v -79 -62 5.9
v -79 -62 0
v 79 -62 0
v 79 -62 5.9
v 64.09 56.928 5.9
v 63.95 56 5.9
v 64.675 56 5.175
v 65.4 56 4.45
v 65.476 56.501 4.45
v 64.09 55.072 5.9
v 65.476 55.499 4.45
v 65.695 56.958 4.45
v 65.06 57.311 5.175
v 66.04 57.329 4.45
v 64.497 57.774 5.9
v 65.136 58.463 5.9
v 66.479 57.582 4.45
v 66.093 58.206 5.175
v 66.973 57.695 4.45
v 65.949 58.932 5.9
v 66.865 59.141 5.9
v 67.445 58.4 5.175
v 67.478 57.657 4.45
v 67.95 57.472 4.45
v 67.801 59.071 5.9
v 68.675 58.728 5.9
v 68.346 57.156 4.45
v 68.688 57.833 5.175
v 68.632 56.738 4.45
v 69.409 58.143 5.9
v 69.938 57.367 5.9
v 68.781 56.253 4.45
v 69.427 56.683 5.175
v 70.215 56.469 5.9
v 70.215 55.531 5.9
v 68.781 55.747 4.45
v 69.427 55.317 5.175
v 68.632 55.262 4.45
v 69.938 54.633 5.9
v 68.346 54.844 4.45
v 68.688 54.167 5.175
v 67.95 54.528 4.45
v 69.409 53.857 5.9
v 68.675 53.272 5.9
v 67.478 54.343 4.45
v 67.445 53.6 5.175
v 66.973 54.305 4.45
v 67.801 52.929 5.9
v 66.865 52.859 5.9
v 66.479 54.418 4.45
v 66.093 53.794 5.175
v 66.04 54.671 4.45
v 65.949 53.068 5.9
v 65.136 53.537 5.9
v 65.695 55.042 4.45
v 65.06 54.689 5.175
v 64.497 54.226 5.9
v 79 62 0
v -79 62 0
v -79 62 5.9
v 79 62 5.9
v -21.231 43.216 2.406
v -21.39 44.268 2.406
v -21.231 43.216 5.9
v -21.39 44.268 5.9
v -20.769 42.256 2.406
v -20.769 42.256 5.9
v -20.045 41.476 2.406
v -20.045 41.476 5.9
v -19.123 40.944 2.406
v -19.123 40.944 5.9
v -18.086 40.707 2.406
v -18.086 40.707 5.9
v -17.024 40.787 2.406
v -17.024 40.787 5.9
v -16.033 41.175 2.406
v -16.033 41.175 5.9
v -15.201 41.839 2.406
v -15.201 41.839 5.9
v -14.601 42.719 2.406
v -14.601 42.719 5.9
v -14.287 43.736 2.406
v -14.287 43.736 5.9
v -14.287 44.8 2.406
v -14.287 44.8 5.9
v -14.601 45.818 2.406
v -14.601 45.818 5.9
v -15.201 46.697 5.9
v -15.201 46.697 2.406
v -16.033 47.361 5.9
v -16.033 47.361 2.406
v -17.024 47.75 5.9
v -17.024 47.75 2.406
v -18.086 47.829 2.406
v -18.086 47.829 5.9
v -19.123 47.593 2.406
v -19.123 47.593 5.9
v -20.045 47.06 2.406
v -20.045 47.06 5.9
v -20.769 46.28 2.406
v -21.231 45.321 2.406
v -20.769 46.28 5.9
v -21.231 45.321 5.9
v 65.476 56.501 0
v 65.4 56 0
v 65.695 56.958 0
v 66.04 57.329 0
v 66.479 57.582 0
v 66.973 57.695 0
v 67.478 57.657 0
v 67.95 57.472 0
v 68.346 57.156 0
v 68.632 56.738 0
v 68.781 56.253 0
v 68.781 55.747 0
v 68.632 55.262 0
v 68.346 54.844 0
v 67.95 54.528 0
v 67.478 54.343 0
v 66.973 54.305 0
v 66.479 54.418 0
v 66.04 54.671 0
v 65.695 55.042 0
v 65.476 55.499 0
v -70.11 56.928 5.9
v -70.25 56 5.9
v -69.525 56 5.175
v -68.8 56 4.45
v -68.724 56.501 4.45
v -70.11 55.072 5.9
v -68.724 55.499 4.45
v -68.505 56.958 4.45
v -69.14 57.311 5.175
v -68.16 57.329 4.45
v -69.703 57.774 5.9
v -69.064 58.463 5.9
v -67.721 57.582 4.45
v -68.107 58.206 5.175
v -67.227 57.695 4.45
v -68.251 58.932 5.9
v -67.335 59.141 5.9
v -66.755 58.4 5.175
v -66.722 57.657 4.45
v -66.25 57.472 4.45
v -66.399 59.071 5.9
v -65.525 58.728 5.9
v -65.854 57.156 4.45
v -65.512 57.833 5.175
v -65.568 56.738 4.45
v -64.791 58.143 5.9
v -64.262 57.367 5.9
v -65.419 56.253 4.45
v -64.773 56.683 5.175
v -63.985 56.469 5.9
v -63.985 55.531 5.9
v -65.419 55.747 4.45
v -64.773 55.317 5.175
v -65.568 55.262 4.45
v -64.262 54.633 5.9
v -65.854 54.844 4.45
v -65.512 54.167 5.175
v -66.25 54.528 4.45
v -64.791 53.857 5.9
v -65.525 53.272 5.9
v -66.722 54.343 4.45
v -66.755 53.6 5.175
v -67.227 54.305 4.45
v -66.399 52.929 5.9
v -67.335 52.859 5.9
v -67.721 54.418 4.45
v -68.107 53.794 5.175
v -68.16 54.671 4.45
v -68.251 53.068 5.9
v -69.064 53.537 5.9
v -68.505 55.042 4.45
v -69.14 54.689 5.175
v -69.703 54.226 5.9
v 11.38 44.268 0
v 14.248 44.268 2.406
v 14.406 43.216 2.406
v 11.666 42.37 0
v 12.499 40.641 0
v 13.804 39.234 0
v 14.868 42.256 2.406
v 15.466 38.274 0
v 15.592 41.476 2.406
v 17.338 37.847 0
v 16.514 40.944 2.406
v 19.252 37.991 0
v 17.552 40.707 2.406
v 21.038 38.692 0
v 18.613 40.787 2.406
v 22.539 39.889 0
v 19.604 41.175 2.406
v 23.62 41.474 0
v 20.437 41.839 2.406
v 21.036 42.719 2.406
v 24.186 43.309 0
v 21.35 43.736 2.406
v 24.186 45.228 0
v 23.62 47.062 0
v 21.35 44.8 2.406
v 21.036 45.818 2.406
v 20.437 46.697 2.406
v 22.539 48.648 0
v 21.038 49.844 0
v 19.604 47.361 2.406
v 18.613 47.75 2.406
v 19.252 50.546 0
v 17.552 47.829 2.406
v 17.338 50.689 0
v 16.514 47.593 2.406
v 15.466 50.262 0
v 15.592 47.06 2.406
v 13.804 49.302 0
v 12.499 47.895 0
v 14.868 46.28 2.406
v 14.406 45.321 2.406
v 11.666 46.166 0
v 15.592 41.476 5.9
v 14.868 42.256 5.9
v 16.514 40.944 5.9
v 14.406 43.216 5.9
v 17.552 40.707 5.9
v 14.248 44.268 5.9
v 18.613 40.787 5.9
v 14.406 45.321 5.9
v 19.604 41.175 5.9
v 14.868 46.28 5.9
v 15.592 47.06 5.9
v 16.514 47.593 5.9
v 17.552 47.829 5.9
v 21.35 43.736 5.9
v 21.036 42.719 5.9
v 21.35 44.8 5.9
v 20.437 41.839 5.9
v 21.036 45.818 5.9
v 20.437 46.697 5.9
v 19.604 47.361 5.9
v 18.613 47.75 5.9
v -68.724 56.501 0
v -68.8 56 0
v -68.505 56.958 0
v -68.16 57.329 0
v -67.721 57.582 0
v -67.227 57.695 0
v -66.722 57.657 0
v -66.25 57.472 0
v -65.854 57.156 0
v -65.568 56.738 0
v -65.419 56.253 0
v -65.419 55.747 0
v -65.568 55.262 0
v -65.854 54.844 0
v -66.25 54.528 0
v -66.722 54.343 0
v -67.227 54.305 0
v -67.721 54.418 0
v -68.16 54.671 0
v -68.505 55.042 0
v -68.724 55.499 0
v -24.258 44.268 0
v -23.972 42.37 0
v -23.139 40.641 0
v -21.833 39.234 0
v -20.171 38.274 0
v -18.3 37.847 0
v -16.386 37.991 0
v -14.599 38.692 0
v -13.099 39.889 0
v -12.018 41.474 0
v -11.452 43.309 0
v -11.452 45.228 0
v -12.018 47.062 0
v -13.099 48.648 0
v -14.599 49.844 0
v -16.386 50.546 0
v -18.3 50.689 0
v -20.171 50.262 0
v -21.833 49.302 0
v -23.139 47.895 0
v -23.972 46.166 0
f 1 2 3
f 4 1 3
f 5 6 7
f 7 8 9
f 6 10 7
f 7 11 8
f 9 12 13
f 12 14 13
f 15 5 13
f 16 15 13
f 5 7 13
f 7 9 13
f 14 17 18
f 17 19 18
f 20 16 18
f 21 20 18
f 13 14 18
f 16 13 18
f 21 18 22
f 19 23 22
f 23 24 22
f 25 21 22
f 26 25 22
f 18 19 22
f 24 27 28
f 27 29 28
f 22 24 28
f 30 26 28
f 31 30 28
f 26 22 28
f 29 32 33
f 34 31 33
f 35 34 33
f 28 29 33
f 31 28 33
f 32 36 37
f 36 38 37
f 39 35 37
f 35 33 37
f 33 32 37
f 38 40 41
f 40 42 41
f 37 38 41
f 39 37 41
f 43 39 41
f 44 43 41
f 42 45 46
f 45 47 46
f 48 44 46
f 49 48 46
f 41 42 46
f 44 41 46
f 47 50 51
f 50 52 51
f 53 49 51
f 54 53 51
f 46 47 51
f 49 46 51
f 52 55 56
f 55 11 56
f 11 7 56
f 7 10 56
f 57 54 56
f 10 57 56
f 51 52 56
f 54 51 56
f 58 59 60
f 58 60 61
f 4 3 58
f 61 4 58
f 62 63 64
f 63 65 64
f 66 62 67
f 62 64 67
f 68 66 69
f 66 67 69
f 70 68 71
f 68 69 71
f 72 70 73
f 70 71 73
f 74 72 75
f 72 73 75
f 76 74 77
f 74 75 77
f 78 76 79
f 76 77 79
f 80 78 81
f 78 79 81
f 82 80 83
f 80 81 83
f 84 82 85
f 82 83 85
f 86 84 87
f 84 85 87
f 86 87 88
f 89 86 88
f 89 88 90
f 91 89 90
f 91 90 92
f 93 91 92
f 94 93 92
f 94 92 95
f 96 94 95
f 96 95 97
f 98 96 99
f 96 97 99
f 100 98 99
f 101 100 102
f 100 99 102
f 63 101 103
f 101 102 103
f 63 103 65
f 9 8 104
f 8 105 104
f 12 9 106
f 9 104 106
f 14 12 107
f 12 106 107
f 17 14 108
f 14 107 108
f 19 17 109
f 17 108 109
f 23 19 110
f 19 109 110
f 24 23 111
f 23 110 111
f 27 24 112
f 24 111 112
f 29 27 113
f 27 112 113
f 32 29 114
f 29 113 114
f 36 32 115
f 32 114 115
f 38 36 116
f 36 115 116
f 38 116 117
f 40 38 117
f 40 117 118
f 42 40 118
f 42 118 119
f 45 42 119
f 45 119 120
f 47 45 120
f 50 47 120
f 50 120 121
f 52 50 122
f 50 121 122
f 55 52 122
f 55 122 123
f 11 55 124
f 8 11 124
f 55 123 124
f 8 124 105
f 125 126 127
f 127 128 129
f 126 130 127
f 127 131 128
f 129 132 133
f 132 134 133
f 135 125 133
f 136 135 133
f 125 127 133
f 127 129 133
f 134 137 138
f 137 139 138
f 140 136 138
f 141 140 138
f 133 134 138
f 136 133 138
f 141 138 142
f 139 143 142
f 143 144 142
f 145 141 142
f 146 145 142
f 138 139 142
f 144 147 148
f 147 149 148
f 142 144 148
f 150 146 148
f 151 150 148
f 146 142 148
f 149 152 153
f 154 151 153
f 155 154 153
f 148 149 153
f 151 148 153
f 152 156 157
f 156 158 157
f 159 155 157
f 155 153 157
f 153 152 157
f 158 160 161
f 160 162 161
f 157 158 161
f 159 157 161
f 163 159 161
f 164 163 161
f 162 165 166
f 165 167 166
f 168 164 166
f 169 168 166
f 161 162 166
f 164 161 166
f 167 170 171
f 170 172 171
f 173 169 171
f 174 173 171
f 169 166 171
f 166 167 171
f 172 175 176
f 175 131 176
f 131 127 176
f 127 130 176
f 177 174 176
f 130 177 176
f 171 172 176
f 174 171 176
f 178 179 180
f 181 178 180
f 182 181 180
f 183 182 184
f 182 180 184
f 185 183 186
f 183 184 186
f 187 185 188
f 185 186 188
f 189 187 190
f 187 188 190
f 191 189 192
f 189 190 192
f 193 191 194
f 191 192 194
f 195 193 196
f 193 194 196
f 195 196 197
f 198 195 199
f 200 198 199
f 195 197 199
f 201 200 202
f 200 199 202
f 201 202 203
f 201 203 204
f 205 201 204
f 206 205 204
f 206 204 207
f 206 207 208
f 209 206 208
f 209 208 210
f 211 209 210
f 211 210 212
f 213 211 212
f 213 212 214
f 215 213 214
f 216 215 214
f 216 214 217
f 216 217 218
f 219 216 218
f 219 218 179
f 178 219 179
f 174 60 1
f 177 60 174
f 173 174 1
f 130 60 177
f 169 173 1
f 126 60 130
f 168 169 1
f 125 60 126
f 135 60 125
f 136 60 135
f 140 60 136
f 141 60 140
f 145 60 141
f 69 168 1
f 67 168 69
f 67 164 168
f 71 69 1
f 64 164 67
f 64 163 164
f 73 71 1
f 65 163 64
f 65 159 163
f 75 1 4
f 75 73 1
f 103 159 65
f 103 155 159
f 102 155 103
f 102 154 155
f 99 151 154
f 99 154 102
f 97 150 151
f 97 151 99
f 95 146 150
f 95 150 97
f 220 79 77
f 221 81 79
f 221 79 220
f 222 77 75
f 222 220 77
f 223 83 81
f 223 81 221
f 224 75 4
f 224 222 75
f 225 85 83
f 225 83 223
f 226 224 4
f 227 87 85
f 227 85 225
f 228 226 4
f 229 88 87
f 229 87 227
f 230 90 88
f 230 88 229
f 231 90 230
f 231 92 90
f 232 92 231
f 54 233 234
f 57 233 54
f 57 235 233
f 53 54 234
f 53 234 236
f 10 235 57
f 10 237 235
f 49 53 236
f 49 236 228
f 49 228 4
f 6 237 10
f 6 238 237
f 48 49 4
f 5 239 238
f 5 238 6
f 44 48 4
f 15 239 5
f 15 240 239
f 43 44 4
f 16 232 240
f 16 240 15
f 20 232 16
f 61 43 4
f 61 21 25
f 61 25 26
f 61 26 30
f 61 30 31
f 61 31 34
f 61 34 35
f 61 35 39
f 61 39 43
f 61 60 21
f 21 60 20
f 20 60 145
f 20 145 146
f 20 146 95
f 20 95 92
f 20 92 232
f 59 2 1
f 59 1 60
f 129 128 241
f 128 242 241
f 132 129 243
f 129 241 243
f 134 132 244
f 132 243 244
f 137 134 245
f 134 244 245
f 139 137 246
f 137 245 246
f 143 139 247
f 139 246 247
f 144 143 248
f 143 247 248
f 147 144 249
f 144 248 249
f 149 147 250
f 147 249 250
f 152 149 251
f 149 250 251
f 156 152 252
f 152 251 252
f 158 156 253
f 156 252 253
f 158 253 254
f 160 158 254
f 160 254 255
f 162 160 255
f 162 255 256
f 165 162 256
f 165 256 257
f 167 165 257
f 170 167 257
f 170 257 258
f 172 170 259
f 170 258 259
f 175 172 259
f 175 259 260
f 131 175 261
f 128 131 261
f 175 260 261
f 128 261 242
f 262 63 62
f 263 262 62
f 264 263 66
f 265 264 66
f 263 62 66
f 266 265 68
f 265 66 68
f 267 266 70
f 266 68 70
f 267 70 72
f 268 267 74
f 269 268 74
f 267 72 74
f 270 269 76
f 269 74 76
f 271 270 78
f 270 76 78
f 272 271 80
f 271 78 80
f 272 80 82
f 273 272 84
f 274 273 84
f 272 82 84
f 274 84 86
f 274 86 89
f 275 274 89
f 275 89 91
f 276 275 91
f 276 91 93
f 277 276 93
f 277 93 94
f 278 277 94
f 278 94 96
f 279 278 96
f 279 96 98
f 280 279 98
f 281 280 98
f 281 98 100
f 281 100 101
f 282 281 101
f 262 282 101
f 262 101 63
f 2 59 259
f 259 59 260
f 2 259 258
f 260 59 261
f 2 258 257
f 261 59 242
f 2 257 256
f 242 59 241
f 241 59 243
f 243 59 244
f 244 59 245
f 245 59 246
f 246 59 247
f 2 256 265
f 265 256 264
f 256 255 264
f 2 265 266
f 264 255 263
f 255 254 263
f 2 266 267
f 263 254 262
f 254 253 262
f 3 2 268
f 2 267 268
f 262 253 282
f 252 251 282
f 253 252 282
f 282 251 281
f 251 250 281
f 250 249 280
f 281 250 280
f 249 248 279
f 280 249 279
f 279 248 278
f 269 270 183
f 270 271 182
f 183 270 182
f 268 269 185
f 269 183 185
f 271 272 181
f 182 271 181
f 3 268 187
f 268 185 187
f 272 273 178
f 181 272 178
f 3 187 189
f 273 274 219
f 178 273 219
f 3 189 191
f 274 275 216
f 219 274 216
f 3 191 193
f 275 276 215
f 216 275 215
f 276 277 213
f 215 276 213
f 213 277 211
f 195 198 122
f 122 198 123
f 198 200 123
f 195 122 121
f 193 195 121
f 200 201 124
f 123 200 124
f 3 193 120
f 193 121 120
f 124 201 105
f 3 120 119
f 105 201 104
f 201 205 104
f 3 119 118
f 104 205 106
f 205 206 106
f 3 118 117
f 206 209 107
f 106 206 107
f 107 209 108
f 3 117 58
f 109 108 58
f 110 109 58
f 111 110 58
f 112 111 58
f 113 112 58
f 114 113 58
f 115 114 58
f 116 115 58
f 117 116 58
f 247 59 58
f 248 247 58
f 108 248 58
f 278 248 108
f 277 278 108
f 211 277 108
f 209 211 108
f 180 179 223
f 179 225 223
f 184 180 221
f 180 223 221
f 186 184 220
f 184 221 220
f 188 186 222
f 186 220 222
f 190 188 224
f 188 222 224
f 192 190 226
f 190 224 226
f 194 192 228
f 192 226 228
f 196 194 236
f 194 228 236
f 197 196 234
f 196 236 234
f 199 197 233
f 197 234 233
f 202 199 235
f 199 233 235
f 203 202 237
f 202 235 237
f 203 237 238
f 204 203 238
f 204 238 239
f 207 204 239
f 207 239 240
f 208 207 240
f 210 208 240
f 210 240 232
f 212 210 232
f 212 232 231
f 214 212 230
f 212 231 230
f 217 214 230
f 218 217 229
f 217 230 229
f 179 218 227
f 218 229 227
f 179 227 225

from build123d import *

# Parameters (mm, degrees)
SKETCH1_W                                           = 158
SKETCH1_H                                           = 124
BOSS_EXTRUDE1_DEPTH                                 = 5.9
CSK_FOR_M3_FLAT_HEAD_MACHINE_SCREW1_D               = 3.4
CSK_FOR_M3_FLAT_HEAD_MACHINE_SCREW1_DEPTH           = 10
CSK_FOR_M3_FLAT_HEAD_MACHINE_SCREW1_CSINK_D         = 6.3
CSK_FOR_M3_FLAT_HEAD_MACHINE_SCREW1_CSINK_ANGLE     = 90
CSK_FOR_M3_FLAT_HEAD_MACHINE_SCREW1_TIP             = 1.021463052
CSK_FOR_1_4_FLAT_HEAD_MACHINE_SCREW_100_D           = 7.14248
CSK_FOR_1_4_FLAT_HEAD_MACHINE_SCREW_100_CSINK_D     = 12.8778
CSK_FOR_1_4_FLAT_HEAD_MACHINE_SCREW_100_CSINK_ANGLE = 100


with BuildPart() as part:
    # Sketch1 → Boss-Extrude1 (new body)
    with BuildSketch(Plane.XY):
        Rectangle(SKETCH1_W, SKETCH1_H)
    extrude(amount=BOSS_EXTRUDE1_DEPTH)

    # CSK for M3 Flat Head Machine Screw1
    with Locations(Plane.XY.offset(5.9)):
        with Locations((-67.1, 56), (67.1, 56)):
            CounterSinkHole(CSK_FOR_M3_FLAT_HEAD_MACHINE_SCREW1_D / 2, CSK_FOR_M3_FLAT_HEAD_MACHINE_SCREW1_CSINK_D / 2, depth=CSK_FOR_M3_FLAT_HEAD_MACHINE_SCREW1_DEPTH, counter_sink_angle=CSK_FOR_M3_FLAT_HEAD_MACHINE_SCREW1_CSINK_ANGLE)
            with Locations((0, 0, -(CSK_FOR_M3_FLAT_HEAD_MACHINE_SCREW1_DEPTH + CSK_FOR_M3_FLAT_HEAD_MACHINE_SCREW1_TIP / 2))):  # 118° drill point
                Cone(0, CSK_FOR_M3_FLAT_HEAD_MACHINE_SCREW1_D / 2, CSK_FOR_M3_FLAT_HEAD_MACHINE_SCREW1_TIP, mode=Mode.SUBTRACT)

    # CSK for 1/4 Flat Head Machine Screw (100)1 (through all)
    with Locations(Plane(origin=(0, 0, 0), x_dir=(1, 0, 0), z_dir=(0, 0, -1))):
        with Locations((-17.81875, -44.268219257), (17.81875, -44.268219257)):
            CounterSinkHole(CSK_FOR_1_4_FLAT_HEAD_MACHINE_SCREW_100_D / 2, CSK_FOR_1_4_FLAT_HEAD_MACHINE_SCREW_100_CSINK_D / 2, counter_sink_angle=CSK_FOR_1_4_FLAT_HEAD_MACHINE_SCREW_100_CSINK_ANGLE)


solid = part.part
